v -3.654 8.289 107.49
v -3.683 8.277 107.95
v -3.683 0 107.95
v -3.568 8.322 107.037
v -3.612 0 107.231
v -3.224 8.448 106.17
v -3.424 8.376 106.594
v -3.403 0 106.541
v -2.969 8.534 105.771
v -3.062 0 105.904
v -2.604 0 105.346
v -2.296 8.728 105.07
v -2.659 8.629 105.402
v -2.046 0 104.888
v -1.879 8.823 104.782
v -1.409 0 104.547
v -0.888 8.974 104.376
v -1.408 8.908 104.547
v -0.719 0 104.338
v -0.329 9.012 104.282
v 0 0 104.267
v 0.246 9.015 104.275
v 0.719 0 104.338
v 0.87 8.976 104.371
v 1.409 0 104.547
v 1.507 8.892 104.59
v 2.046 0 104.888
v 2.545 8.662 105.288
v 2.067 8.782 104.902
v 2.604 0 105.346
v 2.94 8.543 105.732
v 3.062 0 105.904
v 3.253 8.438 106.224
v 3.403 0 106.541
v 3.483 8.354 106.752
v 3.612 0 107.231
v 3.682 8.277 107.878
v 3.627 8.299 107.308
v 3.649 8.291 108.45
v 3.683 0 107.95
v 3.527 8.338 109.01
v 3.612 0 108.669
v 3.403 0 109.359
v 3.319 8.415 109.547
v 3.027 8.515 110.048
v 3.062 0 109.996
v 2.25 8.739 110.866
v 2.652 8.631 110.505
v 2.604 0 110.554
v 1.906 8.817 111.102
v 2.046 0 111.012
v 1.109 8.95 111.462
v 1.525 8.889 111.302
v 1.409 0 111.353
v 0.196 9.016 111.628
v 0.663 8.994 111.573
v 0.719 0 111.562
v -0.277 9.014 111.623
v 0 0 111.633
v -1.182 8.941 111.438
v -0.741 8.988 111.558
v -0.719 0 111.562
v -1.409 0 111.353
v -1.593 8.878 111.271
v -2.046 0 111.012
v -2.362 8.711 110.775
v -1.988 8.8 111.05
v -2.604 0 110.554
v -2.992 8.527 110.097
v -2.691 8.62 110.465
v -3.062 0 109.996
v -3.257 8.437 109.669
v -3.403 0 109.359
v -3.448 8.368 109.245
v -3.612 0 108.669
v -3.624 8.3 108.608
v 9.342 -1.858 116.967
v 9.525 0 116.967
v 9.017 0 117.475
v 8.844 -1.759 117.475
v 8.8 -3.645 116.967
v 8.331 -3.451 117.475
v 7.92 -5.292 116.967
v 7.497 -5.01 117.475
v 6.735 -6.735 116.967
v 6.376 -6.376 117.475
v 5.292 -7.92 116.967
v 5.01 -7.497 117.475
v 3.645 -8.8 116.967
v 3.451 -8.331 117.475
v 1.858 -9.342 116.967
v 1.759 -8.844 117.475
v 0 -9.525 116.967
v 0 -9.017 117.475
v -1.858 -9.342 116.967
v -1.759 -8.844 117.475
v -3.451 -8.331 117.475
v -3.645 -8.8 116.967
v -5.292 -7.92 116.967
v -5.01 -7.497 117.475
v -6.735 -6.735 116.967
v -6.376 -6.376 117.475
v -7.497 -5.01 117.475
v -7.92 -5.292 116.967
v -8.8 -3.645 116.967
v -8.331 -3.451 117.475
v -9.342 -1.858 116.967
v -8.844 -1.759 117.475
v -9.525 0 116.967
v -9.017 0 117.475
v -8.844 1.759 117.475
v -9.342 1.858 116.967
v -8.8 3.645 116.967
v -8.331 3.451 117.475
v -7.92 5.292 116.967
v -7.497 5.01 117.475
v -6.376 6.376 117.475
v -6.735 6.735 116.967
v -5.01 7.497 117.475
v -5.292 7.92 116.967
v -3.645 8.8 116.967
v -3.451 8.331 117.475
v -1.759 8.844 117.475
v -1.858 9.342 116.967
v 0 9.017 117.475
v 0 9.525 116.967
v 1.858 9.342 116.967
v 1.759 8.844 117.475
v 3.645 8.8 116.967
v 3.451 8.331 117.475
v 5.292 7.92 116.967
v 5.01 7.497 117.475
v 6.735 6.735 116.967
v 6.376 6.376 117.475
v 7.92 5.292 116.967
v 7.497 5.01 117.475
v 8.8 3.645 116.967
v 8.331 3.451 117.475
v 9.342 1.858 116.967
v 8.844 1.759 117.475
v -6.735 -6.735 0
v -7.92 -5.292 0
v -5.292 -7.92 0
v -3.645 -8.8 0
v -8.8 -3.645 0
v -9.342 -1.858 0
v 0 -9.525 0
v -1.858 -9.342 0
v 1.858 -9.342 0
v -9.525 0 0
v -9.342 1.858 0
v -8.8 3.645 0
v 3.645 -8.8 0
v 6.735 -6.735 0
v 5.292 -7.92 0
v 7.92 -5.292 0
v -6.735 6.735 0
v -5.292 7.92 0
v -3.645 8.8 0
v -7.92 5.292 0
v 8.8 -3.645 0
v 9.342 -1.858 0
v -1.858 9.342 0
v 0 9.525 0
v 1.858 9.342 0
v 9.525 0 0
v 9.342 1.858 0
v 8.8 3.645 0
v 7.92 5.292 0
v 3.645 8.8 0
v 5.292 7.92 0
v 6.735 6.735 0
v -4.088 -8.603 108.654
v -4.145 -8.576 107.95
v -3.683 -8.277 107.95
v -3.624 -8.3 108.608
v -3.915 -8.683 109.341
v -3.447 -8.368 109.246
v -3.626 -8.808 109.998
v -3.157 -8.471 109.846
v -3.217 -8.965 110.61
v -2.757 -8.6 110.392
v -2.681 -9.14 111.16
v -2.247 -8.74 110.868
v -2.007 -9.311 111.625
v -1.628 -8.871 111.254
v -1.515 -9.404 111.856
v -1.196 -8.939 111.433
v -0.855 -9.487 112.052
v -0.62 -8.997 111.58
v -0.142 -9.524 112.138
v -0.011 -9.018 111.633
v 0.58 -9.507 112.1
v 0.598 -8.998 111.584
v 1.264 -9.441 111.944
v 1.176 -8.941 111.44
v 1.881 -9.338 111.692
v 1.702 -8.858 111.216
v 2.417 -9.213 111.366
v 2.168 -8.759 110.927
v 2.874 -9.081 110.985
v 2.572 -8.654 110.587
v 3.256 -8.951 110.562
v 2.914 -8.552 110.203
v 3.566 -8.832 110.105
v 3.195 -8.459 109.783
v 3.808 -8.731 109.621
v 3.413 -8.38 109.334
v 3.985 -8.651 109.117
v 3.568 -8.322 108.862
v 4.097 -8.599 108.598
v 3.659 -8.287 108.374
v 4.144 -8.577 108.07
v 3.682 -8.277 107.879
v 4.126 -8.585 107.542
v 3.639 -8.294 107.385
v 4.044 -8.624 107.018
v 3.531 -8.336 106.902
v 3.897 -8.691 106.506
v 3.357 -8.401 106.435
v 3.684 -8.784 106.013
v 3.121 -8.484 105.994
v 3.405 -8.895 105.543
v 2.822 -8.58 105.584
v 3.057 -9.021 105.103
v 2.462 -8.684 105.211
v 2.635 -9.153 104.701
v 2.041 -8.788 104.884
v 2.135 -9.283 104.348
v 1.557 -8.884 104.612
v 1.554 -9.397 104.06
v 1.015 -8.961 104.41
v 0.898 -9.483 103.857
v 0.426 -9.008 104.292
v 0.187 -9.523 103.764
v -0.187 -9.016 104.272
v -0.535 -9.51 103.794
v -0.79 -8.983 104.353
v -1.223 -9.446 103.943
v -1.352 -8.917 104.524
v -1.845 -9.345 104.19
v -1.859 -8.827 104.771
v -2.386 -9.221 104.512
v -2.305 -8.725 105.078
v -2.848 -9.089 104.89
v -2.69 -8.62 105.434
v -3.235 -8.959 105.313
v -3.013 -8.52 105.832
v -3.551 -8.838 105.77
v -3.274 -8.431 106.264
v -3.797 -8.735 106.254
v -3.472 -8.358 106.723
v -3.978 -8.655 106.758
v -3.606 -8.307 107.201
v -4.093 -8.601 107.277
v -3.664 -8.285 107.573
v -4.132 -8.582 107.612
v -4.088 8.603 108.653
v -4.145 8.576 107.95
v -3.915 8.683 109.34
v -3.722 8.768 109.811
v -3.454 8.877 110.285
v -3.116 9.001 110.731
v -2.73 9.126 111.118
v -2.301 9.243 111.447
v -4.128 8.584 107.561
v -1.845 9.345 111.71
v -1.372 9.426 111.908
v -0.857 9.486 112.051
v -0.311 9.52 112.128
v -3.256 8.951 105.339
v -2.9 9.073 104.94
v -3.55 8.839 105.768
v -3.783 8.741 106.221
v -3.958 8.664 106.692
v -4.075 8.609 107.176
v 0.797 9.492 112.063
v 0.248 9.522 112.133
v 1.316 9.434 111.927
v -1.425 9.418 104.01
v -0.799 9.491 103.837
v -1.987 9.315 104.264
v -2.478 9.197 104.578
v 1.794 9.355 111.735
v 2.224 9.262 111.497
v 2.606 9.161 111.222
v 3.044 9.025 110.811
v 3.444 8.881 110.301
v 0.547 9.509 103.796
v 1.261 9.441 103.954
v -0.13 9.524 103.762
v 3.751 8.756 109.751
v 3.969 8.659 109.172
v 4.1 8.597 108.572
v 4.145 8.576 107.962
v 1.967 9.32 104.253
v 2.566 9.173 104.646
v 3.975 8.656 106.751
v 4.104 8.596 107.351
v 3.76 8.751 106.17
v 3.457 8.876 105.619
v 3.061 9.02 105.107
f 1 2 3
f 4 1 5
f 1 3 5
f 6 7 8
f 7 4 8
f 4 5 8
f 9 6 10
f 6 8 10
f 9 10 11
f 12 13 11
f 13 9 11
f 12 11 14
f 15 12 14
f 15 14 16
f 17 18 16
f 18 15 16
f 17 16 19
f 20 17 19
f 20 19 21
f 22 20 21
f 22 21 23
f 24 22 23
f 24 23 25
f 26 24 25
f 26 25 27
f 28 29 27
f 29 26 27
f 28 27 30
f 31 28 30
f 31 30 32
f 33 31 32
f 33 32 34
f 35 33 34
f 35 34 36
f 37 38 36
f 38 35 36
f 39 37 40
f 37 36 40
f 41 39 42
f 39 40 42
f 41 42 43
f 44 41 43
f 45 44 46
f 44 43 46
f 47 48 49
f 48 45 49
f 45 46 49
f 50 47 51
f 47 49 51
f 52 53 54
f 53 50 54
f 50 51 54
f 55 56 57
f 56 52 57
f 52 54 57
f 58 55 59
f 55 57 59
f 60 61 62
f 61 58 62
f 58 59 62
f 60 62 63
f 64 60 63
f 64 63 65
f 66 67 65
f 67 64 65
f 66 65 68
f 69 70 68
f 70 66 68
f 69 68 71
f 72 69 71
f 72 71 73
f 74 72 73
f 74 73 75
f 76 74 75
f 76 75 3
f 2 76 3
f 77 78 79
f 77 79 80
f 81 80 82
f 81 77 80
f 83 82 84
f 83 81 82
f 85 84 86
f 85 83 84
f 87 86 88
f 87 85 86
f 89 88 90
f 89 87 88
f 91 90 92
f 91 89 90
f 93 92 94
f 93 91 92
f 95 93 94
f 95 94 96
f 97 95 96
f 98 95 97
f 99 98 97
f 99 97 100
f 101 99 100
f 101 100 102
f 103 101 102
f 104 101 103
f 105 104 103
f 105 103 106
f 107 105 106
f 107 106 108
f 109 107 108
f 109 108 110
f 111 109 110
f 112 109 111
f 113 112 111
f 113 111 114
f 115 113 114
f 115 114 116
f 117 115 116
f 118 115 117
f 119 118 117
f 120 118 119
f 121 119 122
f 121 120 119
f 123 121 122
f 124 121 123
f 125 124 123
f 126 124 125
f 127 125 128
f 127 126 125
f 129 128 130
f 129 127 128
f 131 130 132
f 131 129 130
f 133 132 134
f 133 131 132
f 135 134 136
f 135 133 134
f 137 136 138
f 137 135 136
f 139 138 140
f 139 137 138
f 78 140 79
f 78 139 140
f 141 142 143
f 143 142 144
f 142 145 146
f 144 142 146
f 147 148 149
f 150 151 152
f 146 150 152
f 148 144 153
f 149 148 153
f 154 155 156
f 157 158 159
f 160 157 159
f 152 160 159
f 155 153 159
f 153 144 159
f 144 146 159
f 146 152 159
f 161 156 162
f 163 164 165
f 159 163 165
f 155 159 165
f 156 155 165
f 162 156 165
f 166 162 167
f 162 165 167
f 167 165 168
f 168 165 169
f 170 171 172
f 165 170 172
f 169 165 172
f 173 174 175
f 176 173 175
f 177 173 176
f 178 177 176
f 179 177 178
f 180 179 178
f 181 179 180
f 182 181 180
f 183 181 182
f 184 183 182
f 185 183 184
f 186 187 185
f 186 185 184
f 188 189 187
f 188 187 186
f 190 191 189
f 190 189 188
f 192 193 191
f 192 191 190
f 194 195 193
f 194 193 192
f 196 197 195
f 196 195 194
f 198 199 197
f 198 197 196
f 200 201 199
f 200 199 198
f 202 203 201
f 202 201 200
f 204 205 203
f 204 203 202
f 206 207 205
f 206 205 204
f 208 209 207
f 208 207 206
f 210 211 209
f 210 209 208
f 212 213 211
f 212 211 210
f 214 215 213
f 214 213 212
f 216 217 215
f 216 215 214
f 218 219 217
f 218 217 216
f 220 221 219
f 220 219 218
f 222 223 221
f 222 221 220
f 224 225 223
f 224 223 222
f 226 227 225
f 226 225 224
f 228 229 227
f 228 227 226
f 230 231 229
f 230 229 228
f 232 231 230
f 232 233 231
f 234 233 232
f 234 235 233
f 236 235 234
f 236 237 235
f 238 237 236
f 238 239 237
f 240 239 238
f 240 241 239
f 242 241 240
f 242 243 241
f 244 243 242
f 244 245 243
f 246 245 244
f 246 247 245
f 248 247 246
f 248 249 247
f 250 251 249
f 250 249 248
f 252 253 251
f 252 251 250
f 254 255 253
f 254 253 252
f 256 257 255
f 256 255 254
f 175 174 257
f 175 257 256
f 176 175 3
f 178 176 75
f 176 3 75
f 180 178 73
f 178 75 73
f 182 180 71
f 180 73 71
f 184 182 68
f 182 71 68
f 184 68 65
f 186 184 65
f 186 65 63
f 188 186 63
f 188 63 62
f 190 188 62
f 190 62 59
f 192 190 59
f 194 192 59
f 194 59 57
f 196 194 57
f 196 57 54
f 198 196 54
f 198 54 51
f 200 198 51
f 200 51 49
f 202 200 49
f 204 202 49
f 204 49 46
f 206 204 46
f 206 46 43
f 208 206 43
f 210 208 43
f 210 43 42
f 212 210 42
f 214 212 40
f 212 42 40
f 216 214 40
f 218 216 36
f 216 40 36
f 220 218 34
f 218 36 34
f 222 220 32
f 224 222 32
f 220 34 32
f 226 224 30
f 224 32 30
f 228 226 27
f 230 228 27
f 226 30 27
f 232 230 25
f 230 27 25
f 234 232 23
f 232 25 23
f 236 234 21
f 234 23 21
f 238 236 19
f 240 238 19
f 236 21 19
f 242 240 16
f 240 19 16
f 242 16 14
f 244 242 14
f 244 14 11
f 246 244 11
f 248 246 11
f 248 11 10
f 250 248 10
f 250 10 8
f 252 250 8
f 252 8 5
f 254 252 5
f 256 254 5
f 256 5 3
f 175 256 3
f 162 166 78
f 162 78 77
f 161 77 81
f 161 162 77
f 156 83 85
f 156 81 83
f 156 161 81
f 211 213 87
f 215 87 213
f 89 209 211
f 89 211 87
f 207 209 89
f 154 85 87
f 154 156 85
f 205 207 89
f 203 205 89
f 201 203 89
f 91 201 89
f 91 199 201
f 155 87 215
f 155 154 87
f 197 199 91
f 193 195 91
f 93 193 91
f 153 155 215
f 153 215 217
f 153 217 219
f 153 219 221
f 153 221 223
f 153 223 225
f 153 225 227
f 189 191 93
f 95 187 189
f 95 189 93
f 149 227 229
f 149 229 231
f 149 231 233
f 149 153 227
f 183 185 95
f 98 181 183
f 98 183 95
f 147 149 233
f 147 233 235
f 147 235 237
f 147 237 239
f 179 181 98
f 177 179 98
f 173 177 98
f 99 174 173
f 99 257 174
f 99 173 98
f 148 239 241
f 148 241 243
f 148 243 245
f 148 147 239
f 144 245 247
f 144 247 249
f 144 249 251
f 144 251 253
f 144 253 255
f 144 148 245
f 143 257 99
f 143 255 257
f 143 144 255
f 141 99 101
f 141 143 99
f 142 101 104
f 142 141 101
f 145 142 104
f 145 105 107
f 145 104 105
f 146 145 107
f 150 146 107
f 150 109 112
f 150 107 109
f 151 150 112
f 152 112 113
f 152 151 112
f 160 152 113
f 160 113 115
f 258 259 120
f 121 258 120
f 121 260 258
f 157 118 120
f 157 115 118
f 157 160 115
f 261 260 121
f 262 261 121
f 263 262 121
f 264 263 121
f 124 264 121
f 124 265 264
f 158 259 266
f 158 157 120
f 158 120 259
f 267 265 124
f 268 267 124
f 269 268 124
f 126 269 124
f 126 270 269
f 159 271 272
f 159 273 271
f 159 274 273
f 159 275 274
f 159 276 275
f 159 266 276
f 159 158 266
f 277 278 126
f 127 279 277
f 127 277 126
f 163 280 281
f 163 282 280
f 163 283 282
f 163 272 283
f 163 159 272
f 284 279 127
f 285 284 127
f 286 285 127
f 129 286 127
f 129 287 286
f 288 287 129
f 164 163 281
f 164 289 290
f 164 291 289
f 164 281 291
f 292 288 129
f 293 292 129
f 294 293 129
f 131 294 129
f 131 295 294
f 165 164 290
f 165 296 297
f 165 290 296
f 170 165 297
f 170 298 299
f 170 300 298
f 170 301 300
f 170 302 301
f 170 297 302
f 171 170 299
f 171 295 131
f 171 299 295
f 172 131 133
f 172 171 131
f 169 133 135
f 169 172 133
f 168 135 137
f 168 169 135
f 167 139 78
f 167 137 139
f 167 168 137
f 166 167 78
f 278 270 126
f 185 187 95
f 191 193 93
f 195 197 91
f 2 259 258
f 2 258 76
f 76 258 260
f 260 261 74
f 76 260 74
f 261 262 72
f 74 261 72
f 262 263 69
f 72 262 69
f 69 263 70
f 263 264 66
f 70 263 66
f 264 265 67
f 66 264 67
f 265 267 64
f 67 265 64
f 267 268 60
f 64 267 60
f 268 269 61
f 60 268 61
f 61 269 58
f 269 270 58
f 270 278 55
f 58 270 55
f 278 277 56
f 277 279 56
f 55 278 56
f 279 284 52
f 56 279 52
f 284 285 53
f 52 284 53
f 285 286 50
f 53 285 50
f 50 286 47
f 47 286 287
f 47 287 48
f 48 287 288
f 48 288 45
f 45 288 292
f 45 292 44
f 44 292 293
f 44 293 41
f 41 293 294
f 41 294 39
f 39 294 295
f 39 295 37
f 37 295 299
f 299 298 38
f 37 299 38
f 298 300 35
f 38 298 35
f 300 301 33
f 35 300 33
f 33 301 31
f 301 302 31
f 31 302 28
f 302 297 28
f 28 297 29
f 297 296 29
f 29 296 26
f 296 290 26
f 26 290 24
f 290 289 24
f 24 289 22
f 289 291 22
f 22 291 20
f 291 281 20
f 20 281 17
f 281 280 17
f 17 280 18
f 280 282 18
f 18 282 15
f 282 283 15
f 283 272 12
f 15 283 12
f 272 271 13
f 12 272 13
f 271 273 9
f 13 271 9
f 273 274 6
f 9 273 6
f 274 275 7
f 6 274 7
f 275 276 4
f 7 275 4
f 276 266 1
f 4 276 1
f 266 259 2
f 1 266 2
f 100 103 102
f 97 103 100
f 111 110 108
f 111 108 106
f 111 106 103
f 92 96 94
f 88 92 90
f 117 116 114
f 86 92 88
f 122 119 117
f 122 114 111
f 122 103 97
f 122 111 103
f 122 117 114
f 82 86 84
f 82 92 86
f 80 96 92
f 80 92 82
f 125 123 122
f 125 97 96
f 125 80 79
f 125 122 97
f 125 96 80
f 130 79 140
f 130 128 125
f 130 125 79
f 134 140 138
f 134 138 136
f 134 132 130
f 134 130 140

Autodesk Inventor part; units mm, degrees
ref_plane "YZ Plane" through (0, 0, 0) normal (1, 0, 0) x (0, 1, 0)
ref_plane "XY Plane" through (0, 0, 0) normal (0, 0, 1) x (1, 0, 0)
sketch "Base" plane through (0, 0, 0) normal (0, 0, 1) x (1, 0, 0)
  circle A0 centre (0, 0) radius 9.525
  dimension "d0" = 19.05
extrude "BaseFeature" add sketch "Base" along normal blind 117.475
chamfer "BaseChamferFeature" distance 0.508 angle 45 1 edges at (-9.525, 0, 117.475)
sketch "MountHole" plane through (0, 0, 0) normal (0, 1, 0) x (-1, 0, 0)
  line L0 (-9.017, 117.475) -> (9.017, 117.475) construction
  line L1 (0, 117.475) -> (0, 111.633) construction
  line L2 (0, 111.633) -> (0, 107.95) construction
  circle A0 centre (0, 107.95) radius 3.683
  point P0 (0, 0)
  dimension "d6" = 5.842
  dimension "d7" = 3.683
extrude "MountHoleFeature" cut sketch "MountHole" along normal through all both and the other way through all
chamfer "MountHoleChamferFeature" distance 0.507 angle 45 2 edges at (3.683, -8.7841, 107.9534) (3.683, 8.7841, 107.9534)
ref_plane "MountPlane" through (0, -10, 0) normal (0, -1, 0) x (1, 0, 0)
properties part number "FA-RMS-15-12-4-Piston"
